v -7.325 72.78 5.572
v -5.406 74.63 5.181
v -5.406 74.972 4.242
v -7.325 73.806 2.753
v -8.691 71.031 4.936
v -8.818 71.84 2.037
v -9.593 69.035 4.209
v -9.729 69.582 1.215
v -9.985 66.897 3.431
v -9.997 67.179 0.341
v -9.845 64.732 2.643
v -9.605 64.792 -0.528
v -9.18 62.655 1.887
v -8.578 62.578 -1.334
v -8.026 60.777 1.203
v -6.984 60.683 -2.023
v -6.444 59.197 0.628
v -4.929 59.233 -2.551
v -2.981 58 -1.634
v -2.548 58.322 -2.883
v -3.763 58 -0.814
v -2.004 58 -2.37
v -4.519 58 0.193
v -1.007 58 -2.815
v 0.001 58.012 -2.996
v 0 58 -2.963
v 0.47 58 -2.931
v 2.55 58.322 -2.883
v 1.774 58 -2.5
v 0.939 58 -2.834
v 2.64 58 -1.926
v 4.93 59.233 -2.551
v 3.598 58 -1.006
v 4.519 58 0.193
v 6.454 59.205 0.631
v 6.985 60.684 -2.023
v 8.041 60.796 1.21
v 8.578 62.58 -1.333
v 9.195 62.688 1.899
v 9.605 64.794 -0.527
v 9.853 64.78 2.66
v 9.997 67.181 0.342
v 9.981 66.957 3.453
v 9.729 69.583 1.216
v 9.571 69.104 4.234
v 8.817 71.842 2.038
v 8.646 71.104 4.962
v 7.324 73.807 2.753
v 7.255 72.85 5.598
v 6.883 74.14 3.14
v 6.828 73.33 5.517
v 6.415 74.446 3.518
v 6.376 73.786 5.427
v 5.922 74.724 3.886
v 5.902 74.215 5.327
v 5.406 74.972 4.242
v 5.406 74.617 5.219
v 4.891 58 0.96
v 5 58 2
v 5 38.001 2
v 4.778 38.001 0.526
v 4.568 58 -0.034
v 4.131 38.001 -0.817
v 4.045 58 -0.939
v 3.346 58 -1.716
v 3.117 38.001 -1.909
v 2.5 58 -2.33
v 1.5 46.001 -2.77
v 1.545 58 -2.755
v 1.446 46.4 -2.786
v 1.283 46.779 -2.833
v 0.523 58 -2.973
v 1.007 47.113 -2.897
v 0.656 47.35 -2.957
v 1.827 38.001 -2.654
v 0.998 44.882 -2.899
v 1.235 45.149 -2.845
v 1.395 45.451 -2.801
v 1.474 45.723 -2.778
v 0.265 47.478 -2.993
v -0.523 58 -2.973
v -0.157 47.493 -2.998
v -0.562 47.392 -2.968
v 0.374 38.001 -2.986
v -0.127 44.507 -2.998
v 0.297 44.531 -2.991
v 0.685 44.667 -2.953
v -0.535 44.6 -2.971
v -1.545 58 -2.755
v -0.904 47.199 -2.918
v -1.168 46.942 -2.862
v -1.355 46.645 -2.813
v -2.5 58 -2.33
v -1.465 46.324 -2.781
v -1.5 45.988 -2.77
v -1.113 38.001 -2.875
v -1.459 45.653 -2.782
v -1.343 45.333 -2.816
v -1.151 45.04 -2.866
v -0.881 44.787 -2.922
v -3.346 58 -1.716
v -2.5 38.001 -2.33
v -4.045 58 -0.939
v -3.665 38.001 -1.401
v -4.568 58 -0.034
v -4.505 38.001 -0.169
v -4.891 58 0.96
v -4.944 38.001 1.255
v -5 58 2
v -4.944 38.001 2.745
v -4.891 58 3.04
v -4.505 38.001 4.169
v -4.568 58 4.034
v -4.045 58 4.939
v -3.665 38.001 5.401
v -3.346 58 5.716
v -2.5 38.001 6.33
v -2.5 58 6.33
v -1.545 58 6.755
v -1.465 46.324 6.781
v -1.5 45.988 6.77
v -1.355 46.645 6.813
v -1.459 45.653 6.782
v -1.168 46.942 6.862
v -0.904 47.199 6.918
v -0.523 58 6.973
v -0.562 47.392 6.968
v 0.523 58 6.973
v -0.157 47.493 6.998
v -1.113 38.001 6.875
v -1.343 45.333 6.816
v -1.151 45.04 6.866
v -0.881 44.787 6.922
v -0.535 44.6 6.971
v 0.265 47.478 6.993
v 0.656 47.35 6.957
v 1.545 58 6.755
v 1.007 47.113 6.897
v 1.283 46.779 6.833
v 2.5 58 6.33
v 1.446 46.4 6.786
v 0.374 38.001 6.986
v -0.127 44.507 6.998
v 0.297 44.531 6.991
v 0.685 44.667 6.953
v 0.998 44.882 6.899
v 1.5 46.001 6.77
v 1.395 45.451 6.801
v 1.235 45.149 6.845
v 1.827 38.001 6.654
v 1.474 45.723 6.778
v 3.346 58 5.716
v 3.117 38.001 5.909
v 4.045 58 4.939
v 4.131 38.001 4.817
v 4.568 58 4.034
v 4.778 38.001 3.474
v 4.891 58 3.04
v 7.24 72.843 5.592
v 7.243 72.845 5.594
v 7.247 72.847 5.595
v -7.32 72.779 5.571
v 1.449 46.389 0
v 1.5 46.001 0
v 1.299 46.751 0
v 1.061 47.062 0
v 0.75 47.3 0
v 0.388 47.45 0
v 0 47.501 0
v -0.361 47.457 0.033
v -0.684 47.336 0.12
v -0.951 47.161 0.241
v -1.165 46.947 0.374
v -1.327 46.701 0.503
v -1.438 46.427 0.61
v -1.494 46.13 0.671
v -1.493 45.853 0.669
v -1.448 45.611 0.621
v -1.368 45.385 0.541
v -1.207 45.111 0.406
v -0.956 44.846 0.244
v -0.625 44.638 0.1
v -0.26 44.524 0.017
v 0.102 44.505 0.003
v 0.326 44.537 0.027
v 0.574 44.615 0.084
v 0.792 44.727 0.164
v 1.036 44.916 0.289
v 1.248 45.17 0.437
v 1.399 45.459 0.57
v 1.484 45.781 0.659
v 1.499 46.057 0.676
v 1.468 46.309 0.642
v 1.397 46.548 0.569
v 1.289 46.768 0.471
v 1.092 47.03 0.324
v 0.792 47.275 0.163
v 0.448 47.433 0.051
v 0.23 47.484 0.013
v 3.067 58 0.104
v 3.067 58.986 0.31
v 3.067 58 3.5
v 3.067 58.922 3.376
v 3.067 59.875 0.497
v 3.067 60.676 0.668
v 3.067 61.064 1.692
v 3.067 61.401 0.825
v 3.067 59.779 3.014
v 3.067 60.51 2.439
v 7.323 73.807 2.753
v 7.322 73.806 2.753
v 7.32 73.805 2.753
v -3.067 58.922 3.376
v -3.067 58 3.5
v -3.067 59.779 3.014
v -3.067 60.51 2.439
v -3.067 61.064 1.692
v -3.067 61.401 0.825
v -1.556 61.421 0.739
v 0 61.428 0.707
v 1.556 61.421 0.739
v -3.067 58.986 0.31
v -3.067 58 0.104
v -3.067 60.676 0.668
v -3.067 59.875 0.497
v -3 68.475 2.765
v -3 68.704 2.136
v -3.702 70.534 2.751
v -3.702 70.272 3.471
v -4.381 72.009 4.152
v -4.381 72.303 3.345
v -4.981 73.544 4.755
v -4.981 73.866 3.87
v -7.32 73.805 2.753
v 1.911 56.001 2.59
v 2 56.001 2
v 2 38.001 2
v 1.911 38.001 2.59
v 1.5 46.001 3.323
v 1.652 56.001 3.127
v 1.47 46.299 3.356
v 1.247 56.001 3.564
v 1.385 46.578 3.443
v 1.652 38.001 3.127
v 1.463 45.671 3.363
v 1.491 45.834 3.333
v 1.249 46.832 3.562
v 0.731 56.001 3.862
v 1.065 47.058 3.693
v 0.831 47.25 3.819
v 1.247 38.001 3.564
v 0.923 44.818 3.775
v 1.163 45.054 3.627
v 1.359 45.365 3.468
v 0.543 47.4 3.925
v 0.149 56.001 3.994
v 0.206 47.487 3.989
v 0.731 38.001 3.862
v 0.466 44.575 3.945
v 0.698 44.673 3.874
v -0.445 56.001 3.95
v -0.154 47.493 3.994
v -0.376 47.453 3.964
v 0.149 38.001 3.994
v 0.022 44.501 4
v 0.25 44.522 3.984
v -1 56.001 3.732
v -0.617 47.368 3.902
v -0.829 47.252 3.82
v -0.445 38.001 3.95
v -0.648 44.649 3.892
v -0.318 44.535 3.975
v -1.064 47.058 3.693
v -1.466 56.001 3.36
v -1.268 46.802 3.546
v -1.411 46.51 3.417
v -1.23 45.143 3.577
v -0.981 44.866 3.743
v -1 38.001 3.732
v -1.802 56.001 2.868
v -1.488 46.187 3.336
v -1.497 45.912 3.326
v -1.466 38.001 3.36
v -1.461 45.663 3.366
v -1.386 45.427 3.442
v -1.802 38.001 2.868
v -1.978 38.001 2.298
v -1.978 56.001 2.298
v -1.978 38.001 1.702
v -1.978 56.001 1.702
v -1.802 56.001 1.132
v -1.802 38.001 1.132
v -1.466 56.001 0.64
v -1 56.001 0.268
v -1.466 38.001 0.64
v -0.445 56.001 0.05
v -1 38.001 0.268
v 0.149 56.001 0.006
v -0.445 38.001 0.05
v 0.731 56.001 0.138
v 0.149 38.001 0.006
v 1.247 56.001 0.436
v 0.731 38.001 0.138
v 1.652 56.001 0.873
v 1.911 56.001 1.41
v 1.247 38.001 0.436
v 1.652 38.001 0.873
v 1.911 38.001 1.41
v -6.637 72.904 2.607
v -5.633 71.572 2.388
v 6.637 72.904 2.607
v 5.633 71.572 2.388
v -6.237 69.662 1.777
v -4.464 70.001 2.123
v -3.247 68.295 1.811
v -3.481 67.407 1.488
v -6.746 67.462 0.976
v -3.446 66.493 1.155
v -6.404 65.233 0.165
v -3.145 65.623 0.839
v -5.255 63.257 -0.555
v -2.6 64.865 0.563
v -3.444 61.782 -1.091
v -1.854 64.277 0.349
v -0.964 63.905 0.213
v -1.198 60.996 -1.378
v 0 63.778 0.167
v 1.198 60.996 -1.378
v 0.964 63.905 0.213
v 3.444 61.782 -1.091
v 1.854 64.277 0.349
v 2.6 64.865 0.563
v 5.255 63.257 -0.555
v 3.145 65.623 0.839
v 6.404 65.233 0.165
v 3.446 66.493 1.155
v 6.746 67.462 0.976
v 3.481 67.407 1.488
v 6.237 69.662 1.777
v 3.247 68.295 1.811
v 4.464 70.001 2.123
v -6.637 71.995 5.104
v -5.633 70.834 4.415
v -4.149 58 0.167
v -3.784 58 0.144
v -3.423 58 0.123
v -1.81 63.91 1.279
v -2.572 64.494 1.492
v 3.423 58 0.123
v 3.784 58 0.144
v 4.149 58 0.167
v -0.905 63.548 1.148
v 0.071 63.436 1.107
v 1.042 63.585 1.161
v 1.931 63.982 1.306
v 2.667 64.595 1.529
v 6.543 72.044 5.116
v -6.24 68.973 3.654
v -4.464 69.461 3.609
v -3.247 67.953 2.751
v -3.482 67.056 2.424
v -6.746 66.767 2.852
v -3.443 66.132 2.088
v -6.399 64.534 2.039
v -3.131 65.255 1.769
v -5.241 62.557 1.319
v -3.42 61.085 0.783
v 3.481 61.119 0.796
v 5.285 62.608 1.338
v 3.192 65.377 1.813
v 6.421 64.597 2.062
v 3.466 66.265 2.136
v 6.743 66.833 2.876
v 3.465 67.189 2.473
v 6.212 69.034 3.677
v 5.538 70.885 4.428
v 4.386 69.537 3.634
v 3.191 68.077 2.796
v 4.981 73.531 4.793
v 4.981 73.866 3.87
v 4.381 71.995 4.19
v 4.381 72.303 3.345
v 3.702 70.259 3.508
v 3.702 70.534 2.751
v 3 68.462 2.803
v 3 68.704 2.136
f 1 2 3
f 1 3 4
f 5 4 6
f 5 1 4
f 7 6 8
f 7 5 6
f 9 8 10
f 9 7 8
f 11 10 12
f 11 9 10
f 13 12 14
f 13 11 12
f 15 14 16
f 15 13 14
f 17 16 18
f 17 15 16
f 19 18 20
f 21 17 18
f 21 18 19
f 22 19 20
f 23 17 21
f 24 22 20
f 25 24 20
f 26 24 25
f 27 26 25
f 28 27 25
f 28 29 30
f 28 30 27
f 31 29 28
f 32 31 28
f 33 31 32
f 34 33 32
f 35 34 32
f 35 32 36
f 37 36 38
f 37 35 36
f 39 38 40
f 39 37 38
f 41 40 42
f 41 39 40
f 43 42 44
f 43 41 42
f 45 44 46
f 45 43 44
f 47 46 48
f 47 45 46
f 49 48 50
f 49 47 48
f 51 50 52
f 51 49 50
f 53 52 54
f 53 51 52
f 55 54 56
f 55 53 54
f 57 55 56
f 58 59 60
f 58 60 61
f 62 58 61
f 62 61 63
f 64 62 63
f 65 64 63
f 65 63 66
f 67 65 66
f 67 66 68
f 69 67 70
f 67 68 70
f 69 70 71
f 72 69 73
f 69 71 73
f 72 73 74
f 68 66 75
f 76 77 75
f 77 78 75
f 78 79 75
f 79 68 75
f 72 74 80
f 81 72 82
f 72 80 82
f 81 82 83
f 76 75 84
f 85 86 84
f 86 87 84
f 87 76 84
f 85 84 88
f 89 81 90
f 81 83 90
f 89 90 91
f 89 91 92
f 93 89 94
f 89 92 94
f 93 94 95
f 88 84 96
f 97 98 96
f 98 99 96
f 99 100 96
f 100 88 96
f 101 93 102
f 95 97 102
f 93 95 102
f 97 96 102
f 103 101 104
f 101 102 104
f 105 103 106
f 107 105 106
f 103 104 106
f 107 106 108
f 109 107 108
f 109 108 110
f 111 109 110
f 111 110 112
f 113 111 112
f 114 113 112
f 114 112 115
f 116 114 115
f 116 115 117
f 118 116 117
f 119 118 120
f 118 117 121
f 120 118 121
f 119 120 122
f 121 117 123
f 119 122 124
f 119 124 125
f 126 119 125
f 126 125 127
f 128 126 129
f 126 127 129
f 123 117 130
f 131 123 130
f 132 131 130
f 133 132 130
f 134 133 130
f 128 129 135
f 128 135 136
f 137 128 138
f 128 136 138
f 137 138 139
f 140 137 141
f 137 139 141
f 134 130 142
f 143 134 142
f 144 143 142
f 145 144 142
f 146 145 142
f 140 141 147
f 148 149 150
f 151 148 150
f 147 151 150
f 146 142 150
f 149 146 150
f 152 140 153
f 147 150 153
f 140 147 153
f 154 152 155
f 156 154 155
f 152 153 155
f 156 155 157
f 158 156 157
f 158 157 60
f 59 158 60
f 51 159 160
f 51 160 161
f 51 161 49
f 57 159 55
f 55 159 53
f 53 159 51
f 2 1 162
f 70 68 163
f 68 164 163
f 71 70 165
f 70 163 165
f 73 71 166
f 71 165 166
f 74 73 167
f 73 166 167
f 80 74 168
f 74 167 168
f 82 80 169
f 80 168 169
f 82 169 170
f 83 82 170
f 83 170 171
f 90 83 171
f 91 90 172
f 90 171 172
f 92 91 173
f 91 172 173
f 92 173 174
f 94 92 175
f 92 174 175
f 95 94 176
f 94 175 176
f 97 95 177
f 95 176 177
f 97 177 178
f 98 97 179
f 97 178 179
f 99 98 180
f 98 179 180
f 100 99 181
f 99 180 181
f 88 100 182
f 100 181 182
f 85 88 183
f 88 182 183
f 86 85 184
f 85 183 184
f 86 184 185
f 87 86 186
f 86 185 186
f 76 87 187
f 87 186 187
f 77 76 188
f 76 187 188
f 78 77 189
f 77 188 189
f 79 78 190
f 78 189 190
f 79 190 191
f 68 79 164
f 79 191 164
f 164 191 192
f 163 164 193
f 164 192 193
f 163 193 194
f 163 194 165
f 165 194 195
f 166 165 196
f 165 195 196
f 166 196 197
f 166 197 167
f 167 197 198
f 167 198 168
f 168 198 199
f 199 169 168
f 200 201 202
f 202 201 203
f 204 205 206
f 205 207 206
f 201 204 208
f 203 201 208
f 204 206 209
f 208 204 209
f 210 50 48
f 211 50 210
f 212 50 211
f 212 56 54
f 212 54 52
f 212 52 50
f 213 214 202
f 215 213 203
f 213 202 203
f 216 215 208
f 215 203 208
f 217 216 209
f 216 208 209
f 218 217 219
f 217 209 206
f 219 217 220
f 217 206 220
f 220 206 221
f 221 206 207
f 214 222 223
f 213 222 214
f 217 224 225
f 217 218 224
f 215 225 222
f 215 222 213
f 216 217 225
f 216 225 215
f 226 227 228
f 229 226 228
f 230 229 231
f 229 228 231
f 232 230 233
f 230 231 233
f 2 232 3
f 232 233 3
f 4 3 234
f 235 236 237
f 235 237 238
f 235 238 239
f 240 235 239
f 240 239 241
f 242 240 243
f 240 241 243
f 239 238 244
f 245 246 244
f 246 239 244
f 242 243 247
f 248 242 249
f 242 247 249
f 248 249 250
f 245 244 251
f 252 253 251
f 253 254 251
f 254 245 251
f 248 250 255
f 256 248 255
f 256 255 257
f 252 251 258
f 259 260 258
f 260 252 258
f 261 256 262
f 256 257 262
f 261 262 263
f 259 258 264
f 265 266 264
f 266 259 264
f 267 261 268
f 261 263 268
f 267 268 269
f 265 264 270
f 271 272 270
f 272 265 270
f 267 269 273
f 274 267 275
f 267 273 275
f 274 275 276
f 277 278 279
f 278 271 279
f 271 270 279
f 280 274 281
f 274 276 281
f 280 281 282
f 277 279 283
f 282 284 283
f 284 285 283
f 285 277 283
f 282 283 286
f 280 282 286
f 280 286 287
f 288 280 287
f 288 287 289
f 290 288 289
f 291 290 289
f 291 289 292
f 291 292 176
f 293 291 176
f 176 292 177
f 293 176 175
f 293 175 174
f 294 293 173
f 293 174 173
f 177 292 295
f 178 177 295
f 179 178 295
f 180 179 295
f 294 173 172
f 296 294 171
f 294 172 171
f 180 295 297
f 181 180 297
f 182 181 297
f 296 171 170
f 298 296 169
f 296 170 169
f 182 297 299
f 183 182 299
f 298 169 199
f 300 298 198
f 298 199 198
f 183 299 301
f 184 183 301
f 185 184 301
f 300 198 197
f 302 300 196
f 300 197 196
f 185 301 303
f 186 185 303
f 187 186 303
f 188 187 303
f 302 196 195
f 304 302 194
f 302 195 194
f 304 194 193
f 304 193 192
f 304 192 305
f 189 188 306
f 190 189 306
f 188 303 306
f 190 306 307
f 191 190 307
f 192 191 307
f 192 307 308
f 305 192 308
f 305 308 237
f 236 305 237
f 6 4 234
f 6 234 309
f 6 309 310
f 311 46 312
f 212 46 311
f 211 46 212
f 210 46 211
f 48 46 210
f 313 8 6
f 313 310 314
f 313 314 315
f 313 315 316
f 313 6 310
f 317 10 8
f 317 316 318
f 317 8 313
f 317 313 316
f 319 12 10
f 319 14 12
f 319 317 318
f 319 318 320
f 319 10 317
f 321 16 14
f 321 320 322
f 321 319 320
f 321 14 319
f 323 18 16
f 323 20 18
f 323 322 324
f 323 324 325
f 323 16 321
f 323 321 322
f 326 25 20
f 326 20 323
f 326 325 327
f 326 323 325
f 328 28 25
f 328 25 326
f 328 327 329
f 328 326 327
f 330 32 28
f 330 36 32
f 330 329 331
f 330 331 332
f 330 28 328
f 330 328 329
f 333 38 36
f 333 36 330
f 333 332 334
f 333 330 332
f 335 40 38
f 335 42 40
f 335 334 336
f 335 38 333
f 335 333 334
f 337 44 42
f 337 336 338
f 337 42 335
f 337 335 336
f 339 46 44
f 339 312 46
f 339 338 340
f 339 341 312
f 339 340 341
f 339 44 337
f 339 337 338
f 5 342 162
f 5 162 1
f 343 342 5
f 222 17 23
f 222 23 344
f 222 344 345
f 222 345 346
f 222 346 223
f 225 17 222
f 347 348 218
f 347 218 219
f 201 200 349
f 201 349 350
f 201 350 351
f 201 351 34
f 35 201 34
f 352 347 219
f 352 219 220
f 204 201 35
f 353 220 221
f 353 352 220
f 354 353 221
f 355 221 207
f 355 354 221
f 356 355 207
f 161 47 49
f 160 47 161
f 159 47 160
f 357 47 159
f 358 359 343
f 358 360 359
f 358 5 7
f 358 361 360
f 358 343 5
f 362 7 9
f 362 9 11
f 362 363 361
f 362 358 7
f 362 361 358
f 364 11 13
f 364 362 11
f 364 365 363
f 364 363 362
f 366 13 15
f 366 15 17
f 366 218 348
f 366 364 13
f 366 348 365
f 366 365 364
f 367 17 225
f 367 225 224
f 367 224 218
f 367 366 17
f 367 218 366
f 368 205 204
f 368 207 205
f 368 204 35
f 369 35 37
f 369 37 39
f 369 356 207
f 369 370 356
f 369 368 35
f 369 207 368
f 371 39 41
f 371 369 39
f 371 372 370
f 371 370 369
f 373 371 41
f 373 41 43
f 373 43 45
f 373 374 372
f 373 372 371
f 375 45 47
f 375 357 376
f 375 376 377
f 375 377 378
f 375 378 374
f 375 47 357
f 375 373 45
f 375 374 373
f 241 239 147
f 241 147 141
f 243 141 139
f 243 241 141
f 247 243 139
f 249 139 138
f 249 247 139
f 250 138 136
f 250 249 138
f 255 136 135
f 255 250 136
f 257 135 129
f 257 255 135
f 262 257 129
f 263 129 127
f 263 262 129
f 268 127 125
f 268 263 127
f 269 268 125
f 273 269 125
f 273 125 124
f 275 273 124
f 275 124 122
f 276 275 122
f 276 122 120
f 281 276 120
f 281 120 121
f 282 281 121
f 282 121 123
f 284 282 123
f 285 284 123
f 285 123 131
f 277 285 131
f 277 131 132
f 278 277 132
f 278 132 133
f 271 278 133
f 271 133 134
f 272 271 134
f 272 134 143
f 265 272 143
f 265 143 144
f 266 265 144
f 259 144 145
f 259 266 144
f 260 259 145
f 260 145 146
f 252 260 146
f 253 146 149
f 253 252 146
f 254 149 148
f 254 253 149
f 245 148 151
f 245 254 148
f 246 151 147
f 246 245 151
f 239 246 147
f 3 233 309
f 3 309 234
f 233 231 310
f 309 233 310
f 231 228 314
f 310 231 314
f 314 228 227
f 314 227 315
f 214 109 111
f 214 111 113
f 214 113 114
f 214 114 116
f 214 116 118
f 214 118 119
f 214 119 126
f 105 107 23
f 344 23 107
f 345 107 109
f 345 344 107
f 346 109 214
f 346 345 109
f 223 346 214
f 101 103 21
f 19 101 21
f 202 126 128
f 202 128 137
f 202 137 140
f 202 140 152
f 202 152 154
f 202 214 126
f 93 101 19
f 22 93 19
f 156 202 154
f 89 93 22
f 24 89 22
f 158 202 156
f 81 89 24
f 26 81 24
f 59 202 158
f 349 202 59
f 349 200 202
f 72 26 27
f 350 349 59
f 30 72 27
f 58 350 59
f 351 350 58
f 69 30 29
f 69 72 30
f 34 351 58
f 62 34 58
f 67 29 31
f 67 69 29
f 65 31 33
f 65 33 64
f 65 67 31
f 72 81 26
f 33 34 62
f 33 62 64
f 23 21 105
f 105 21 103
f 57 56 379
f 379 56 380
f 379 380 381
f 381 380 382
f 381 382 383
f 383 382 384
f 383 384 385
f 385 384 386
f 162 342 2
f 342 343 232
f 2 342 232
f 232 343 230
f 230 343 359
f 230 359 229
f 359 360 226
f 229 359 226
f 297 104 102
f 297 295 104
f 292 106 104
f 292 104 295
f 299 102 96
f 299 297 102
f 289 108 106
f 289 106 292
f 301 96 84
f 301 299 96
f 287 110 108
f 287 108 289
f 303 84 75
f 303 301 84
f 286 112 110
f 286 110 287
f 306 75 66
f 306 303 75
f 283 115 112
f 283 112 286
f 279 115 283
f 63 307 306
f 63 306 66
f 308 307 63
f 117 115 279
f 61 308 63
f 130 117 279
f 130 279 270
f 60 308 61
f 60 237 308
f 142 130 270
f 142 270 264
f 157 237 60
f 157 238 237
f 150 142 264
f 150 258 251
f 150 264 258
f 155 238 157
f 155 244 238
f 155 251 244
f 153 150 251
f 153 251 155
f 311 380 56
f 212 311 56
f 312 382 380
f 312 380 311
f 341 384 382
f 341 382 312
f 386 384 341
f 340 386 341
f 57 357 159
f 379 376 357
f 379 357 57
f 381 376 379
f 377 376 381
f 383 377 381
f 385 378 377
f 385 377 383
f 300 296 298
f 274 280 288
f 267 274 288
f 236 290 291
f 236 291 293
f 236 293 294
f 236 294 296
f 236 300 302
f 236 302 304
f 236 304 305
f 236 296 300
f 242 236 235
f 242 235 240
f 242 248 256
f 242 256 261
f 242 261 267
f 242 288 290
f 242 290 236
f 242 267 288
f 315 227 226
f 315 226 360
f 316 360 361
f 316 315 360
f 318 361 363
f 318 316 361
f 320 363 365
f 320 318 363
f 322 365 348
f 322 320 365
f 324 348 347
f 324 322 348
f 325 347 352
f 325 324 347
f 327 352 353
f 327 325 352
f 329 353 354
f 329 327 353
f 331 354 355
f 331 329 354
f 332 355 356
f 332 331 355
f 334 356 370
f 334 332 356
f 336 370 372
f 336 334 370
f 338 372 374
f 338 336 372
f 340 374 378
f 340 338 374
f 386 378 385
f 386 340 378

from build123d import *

# Parameters (mm, degrees)
SKETCH1_W                    = 30
SKETCH1_H                    = 30
BOSS_EXTRUDE1_DEPTH          = 3
SKETCH2_R                    = 5
BOSS_EXTRUDE2_DEPTH          = 55
CUT_EXTRUDE2_DEPTH           = 55
CUT_EXTRUDE3_DEPTH           = 7
CUT_EXTRUDE3_TAPER           = -9
CUT_EXTRUDE3_OTHER_WAY_DEPTH = 2
CUT_EXTRUDE4_DEPTH           = 7
CUT_EXTRUDE4_TAPER           = -9
CUT_EXTRUDE4_OTHER_WAY_DEPTH = 2
CUT_EXTRUDE4_OTHER_WAY_TAPER = -9
SKETCH11_W                   = 42.456870871
SKETCH11_H                   = 39.887112897
CUT_EXTRUDE5_DEPTH           = 16
CUT_EXTRUDE5_DEPTH_BACK      = 16
SKETCH12_W                   = 30
SKETCH12_H                   = 30
BOSS_EXTRUDE3_DEPTH          = 3
SKETCH13_W                   = 6.134758984
SKETCH13_H                   = 3.5
REVOLVE3_ANGLE               = 90
SKETCH14_W                   = 34.327932252
SKETCH14_H                   = 34.043423274
CUT_EXTRUDE6_DEPTH           = 3.3
SKETCH17_R                   = 2
CUT_EXTRUDE7_DEPTH           = 18
SKETCH18_R                   = 1.5
CUT_EXTRUDE8_DEPTH           = 8
CUT_EXTRUDE8_DEPTH_BACK      = 4


with BuildPart() as part:
    # Sketch1 → Boss-Extrude1 (new body)
    with BuildSketch(Plane(origin=(0, 0, 0), x_dir=(1, 0, 0), z_dir=(0, 1, 0))):
        Rectangle(SKETCH1_W, SKETCH1_H)
    extrude(amount=BOSS_EXTRUDE1_DEPTH)

    # Sketch2 → Boss-Extrude2 (add)
    with BuildSketch(Plane(origin=(0, 3, 0), x_dir=(1, 0, 0), z_dir=(0, 1, 0))):
        with Locations((0, -2)):
            Circle(SKETCH2_R)
    extrude(amount=BOSS_EXTRUDE2_DEPTH)

    # Sketch4 → Revolve1 (revolve)
    with BuildSketch(Plane(origin=(0, 0, 0), x_dir=(0, 0, -1), z_dir=(1, 0, 0))):
        Polygon((2.995694392, 58.01182956), (0.17661653, 56.98576913), (-1.106821781, 63.435791308), (-0.16712916, 63.777811451), align=None)
    revolve(axis=Axis((0, 68.333514617, -2.116247015), (0, -0.342020143, 0.939692621)))

    # Sketch5 → Cut-Extrude2 (cut)
    with BuildSketch(Plane(origin=(0, 7.748892564, -21.289907346), x_dir=(1, 0, 0), z_dir=(0, 0.342020143, -0.939692621))):
        Polygon((-3, -65.291475968), (-6.572175958, -75.105948751), (6.572175958, -75.105948751), (3, -65.291475968), align=None)
    extrude(amount=-CUT_EXTRUDE2_DEPTH, mode=Mode.SUBTRACT)

    # Sketch6 → Cut-Extrude3 (cut)
    with BuildSketch(Plane(origin=(37.638193634, 42.150337699, 15.341468287), x_dir=(0, -0.342020143, 0.939692621), z_dir=(0.64278761, 0.71984631, 0.26200263))):
        Polygon((-22.656246175, -42.076297889), (-21.656246175, -42.076297889), (-22.656246175, -39.576297889), align=None)
        Polygon((-19.616275943, -42.076297889), (-19.616275943, -39.576297889), (-20.616275943, -42.076297889), align=None)
    extrude(amount=-CUT_EXTRUDE3_DEPTH, taper=CUT_EXTRUDE3_TAPER, mode=Mode.SUBTRACT)

    # Sketch6 → Cut-Extrude3 other way (cut)
    with BuildSketch(Plane(origin=(37.638193634, 42.150337699, 15.341468287), x_dir=(0, -0.342020143, 0.939692621), z_dir=(0.64278761, 0.71984631, 0.26200263))):
        Polygon((-22.656246175, -42.076297889), (-21.656246175, -42.076297889), (-22.656246175, -39.576297889), align=None)
        Polygon((-19.616275943, -42.076297889), (-19.616275943, -39.576297889), (-20.616275943, -42.076297889), align=None)
    extrude(amount=CUT_EXTRUDE3_OTHER_WAY_DEPTH, mode=Mode.SUBTRACT)

    # Sketch8 → Cut-Extrude4 (cut)
    with BuildSketch(Plane(origin=(-37.638193634, 42.150337699, 15.341468287), x_dir=(0, 0.342020143, -0.939692621), z_dir=(0.64278761, -0.71984631, -0.26200263))):
        Polygon((22.656246175, 42.076297889), (21.656246175, 42.076297889), (22.656246175, 39.576297889), align=None)
        Polygon((20.656246175, 42.076297889), (19.656246175, 42.076297889), (19.656246175, 39.576297889), align=None)
    extrude(amount=CUT_EXTRUDE4_DEPTH, taper=CUT_EXTRUDE4_TAPER, mode=Mode.SUBTRACT)

    # Sketch8 → Cut-Extrude4 other way (cut)
    with BuildSketch(Plane(origin=(-37.638193634, 42.150337699, 15.341468287), x_dir=(0, 0.342020143, -0.939692621), z_dir=(0.64278761, -0.71984631, -0.26200263))):
        Polygon((22.656246175, 42.076297889), (21.656246175, 42.076297889), (22.656246175, 39.576297889), align=None)
        Polygon((20.656246175, 42.076297889), (19.656246175, 42.076297889), (19.656246175, 39.576297889), align=None)
    extrude(amount=-CUT_EXTRUDE4_OTHER_WAY_DEPTH, taper=CUT_EXTRUDE4_OTHER_WAY_TAPER, mode=Mode.SUBTRACT)

    # Sketch11 → Cut-Extrude5 (cut, two sides)
    with BuildSketch(Plane(origin=(0, 0, 0), x_dir=(0, 0, -1), z_dir=(1, 0, 0))) as cut_extrude5_sk:
        with Locations((2.849079493, 17.75767337)):
            Rectangle(SKETCH11_W, SKETCH11_H)
    extrude(amount=CUT_EXTRUDE5_DEPTH, mode=Mode.SUBTRACT)
    extrude(cut_extrude5_sk.sketch, amount=-CUT_EXTRUDE5_DEPTH_BACK, mode=Mode.SUBTRACT)

    # Sketch12 → Boss-Extrude3 (add)
    with BuildSketch(Plane.XZ.offset(-37.701229818)):
        Rectangle(SKETCH12_W, SKETCH12_H)
    extrude(amount=BOSS_EXTRUDE3_DEPTH)

    # Sketch13 → Revolve3 (revolve)
    with BuildSketch(Plane(origin=(0, 58, 0), x_dir=(1, 0, 0), z_dir=(0, 1, 0))):
        with Locations((0, -1.75)):
            Rectangle(SKETCH13_W, SKETCH13_H)
    revolve(axis=Axis((-3.067379492, 58, 0), (-1, 0, 0)), revolution_arc=REVOLVE3_ANGLE)

    # Sketch14 → Cut-Extrude6 (cut)
    with BuildSketch(Plane.XZ.offset(-34.701229818)):
        with Locations((-1.184585751, 0.782917941)):
            Rectangle(SKETCH14_W, SKETCH14_H)
    extrude(amount=-CUT_EXTRUDE6_DEPTH, mode=Mode.SUBTRACT)

    # Sketch17 → Cut-Extrude7 (cut)
    with BuildSketch(Plane.XZ.offset(-38.001229818)):
        with Locations((0, 2)):
            Circle(SKETCH17_R)
    extrude(amount=-CUT_EXTRUDE7_DEPTH, mode=Mode.SUBTRACT)

    # Sketch18 → Cut-Extrude8 (cut, two sides)
    with BuildSketch(Plane.XY) as cut_extrude8_sk:
        with Locations((0, 46.001229818)):
            Circle(SKETCH18_R)
    extrude(amount=CUT_EXTRUDE8_DEPTH, mode=Mode.SUBTRACT)
    extrude(cut_extrude8_sk.sketch, amount=-CUT_EXTRUDE8_DEPTH_BACK, mode=Mode.SUBTRACT)


solid = part.part
